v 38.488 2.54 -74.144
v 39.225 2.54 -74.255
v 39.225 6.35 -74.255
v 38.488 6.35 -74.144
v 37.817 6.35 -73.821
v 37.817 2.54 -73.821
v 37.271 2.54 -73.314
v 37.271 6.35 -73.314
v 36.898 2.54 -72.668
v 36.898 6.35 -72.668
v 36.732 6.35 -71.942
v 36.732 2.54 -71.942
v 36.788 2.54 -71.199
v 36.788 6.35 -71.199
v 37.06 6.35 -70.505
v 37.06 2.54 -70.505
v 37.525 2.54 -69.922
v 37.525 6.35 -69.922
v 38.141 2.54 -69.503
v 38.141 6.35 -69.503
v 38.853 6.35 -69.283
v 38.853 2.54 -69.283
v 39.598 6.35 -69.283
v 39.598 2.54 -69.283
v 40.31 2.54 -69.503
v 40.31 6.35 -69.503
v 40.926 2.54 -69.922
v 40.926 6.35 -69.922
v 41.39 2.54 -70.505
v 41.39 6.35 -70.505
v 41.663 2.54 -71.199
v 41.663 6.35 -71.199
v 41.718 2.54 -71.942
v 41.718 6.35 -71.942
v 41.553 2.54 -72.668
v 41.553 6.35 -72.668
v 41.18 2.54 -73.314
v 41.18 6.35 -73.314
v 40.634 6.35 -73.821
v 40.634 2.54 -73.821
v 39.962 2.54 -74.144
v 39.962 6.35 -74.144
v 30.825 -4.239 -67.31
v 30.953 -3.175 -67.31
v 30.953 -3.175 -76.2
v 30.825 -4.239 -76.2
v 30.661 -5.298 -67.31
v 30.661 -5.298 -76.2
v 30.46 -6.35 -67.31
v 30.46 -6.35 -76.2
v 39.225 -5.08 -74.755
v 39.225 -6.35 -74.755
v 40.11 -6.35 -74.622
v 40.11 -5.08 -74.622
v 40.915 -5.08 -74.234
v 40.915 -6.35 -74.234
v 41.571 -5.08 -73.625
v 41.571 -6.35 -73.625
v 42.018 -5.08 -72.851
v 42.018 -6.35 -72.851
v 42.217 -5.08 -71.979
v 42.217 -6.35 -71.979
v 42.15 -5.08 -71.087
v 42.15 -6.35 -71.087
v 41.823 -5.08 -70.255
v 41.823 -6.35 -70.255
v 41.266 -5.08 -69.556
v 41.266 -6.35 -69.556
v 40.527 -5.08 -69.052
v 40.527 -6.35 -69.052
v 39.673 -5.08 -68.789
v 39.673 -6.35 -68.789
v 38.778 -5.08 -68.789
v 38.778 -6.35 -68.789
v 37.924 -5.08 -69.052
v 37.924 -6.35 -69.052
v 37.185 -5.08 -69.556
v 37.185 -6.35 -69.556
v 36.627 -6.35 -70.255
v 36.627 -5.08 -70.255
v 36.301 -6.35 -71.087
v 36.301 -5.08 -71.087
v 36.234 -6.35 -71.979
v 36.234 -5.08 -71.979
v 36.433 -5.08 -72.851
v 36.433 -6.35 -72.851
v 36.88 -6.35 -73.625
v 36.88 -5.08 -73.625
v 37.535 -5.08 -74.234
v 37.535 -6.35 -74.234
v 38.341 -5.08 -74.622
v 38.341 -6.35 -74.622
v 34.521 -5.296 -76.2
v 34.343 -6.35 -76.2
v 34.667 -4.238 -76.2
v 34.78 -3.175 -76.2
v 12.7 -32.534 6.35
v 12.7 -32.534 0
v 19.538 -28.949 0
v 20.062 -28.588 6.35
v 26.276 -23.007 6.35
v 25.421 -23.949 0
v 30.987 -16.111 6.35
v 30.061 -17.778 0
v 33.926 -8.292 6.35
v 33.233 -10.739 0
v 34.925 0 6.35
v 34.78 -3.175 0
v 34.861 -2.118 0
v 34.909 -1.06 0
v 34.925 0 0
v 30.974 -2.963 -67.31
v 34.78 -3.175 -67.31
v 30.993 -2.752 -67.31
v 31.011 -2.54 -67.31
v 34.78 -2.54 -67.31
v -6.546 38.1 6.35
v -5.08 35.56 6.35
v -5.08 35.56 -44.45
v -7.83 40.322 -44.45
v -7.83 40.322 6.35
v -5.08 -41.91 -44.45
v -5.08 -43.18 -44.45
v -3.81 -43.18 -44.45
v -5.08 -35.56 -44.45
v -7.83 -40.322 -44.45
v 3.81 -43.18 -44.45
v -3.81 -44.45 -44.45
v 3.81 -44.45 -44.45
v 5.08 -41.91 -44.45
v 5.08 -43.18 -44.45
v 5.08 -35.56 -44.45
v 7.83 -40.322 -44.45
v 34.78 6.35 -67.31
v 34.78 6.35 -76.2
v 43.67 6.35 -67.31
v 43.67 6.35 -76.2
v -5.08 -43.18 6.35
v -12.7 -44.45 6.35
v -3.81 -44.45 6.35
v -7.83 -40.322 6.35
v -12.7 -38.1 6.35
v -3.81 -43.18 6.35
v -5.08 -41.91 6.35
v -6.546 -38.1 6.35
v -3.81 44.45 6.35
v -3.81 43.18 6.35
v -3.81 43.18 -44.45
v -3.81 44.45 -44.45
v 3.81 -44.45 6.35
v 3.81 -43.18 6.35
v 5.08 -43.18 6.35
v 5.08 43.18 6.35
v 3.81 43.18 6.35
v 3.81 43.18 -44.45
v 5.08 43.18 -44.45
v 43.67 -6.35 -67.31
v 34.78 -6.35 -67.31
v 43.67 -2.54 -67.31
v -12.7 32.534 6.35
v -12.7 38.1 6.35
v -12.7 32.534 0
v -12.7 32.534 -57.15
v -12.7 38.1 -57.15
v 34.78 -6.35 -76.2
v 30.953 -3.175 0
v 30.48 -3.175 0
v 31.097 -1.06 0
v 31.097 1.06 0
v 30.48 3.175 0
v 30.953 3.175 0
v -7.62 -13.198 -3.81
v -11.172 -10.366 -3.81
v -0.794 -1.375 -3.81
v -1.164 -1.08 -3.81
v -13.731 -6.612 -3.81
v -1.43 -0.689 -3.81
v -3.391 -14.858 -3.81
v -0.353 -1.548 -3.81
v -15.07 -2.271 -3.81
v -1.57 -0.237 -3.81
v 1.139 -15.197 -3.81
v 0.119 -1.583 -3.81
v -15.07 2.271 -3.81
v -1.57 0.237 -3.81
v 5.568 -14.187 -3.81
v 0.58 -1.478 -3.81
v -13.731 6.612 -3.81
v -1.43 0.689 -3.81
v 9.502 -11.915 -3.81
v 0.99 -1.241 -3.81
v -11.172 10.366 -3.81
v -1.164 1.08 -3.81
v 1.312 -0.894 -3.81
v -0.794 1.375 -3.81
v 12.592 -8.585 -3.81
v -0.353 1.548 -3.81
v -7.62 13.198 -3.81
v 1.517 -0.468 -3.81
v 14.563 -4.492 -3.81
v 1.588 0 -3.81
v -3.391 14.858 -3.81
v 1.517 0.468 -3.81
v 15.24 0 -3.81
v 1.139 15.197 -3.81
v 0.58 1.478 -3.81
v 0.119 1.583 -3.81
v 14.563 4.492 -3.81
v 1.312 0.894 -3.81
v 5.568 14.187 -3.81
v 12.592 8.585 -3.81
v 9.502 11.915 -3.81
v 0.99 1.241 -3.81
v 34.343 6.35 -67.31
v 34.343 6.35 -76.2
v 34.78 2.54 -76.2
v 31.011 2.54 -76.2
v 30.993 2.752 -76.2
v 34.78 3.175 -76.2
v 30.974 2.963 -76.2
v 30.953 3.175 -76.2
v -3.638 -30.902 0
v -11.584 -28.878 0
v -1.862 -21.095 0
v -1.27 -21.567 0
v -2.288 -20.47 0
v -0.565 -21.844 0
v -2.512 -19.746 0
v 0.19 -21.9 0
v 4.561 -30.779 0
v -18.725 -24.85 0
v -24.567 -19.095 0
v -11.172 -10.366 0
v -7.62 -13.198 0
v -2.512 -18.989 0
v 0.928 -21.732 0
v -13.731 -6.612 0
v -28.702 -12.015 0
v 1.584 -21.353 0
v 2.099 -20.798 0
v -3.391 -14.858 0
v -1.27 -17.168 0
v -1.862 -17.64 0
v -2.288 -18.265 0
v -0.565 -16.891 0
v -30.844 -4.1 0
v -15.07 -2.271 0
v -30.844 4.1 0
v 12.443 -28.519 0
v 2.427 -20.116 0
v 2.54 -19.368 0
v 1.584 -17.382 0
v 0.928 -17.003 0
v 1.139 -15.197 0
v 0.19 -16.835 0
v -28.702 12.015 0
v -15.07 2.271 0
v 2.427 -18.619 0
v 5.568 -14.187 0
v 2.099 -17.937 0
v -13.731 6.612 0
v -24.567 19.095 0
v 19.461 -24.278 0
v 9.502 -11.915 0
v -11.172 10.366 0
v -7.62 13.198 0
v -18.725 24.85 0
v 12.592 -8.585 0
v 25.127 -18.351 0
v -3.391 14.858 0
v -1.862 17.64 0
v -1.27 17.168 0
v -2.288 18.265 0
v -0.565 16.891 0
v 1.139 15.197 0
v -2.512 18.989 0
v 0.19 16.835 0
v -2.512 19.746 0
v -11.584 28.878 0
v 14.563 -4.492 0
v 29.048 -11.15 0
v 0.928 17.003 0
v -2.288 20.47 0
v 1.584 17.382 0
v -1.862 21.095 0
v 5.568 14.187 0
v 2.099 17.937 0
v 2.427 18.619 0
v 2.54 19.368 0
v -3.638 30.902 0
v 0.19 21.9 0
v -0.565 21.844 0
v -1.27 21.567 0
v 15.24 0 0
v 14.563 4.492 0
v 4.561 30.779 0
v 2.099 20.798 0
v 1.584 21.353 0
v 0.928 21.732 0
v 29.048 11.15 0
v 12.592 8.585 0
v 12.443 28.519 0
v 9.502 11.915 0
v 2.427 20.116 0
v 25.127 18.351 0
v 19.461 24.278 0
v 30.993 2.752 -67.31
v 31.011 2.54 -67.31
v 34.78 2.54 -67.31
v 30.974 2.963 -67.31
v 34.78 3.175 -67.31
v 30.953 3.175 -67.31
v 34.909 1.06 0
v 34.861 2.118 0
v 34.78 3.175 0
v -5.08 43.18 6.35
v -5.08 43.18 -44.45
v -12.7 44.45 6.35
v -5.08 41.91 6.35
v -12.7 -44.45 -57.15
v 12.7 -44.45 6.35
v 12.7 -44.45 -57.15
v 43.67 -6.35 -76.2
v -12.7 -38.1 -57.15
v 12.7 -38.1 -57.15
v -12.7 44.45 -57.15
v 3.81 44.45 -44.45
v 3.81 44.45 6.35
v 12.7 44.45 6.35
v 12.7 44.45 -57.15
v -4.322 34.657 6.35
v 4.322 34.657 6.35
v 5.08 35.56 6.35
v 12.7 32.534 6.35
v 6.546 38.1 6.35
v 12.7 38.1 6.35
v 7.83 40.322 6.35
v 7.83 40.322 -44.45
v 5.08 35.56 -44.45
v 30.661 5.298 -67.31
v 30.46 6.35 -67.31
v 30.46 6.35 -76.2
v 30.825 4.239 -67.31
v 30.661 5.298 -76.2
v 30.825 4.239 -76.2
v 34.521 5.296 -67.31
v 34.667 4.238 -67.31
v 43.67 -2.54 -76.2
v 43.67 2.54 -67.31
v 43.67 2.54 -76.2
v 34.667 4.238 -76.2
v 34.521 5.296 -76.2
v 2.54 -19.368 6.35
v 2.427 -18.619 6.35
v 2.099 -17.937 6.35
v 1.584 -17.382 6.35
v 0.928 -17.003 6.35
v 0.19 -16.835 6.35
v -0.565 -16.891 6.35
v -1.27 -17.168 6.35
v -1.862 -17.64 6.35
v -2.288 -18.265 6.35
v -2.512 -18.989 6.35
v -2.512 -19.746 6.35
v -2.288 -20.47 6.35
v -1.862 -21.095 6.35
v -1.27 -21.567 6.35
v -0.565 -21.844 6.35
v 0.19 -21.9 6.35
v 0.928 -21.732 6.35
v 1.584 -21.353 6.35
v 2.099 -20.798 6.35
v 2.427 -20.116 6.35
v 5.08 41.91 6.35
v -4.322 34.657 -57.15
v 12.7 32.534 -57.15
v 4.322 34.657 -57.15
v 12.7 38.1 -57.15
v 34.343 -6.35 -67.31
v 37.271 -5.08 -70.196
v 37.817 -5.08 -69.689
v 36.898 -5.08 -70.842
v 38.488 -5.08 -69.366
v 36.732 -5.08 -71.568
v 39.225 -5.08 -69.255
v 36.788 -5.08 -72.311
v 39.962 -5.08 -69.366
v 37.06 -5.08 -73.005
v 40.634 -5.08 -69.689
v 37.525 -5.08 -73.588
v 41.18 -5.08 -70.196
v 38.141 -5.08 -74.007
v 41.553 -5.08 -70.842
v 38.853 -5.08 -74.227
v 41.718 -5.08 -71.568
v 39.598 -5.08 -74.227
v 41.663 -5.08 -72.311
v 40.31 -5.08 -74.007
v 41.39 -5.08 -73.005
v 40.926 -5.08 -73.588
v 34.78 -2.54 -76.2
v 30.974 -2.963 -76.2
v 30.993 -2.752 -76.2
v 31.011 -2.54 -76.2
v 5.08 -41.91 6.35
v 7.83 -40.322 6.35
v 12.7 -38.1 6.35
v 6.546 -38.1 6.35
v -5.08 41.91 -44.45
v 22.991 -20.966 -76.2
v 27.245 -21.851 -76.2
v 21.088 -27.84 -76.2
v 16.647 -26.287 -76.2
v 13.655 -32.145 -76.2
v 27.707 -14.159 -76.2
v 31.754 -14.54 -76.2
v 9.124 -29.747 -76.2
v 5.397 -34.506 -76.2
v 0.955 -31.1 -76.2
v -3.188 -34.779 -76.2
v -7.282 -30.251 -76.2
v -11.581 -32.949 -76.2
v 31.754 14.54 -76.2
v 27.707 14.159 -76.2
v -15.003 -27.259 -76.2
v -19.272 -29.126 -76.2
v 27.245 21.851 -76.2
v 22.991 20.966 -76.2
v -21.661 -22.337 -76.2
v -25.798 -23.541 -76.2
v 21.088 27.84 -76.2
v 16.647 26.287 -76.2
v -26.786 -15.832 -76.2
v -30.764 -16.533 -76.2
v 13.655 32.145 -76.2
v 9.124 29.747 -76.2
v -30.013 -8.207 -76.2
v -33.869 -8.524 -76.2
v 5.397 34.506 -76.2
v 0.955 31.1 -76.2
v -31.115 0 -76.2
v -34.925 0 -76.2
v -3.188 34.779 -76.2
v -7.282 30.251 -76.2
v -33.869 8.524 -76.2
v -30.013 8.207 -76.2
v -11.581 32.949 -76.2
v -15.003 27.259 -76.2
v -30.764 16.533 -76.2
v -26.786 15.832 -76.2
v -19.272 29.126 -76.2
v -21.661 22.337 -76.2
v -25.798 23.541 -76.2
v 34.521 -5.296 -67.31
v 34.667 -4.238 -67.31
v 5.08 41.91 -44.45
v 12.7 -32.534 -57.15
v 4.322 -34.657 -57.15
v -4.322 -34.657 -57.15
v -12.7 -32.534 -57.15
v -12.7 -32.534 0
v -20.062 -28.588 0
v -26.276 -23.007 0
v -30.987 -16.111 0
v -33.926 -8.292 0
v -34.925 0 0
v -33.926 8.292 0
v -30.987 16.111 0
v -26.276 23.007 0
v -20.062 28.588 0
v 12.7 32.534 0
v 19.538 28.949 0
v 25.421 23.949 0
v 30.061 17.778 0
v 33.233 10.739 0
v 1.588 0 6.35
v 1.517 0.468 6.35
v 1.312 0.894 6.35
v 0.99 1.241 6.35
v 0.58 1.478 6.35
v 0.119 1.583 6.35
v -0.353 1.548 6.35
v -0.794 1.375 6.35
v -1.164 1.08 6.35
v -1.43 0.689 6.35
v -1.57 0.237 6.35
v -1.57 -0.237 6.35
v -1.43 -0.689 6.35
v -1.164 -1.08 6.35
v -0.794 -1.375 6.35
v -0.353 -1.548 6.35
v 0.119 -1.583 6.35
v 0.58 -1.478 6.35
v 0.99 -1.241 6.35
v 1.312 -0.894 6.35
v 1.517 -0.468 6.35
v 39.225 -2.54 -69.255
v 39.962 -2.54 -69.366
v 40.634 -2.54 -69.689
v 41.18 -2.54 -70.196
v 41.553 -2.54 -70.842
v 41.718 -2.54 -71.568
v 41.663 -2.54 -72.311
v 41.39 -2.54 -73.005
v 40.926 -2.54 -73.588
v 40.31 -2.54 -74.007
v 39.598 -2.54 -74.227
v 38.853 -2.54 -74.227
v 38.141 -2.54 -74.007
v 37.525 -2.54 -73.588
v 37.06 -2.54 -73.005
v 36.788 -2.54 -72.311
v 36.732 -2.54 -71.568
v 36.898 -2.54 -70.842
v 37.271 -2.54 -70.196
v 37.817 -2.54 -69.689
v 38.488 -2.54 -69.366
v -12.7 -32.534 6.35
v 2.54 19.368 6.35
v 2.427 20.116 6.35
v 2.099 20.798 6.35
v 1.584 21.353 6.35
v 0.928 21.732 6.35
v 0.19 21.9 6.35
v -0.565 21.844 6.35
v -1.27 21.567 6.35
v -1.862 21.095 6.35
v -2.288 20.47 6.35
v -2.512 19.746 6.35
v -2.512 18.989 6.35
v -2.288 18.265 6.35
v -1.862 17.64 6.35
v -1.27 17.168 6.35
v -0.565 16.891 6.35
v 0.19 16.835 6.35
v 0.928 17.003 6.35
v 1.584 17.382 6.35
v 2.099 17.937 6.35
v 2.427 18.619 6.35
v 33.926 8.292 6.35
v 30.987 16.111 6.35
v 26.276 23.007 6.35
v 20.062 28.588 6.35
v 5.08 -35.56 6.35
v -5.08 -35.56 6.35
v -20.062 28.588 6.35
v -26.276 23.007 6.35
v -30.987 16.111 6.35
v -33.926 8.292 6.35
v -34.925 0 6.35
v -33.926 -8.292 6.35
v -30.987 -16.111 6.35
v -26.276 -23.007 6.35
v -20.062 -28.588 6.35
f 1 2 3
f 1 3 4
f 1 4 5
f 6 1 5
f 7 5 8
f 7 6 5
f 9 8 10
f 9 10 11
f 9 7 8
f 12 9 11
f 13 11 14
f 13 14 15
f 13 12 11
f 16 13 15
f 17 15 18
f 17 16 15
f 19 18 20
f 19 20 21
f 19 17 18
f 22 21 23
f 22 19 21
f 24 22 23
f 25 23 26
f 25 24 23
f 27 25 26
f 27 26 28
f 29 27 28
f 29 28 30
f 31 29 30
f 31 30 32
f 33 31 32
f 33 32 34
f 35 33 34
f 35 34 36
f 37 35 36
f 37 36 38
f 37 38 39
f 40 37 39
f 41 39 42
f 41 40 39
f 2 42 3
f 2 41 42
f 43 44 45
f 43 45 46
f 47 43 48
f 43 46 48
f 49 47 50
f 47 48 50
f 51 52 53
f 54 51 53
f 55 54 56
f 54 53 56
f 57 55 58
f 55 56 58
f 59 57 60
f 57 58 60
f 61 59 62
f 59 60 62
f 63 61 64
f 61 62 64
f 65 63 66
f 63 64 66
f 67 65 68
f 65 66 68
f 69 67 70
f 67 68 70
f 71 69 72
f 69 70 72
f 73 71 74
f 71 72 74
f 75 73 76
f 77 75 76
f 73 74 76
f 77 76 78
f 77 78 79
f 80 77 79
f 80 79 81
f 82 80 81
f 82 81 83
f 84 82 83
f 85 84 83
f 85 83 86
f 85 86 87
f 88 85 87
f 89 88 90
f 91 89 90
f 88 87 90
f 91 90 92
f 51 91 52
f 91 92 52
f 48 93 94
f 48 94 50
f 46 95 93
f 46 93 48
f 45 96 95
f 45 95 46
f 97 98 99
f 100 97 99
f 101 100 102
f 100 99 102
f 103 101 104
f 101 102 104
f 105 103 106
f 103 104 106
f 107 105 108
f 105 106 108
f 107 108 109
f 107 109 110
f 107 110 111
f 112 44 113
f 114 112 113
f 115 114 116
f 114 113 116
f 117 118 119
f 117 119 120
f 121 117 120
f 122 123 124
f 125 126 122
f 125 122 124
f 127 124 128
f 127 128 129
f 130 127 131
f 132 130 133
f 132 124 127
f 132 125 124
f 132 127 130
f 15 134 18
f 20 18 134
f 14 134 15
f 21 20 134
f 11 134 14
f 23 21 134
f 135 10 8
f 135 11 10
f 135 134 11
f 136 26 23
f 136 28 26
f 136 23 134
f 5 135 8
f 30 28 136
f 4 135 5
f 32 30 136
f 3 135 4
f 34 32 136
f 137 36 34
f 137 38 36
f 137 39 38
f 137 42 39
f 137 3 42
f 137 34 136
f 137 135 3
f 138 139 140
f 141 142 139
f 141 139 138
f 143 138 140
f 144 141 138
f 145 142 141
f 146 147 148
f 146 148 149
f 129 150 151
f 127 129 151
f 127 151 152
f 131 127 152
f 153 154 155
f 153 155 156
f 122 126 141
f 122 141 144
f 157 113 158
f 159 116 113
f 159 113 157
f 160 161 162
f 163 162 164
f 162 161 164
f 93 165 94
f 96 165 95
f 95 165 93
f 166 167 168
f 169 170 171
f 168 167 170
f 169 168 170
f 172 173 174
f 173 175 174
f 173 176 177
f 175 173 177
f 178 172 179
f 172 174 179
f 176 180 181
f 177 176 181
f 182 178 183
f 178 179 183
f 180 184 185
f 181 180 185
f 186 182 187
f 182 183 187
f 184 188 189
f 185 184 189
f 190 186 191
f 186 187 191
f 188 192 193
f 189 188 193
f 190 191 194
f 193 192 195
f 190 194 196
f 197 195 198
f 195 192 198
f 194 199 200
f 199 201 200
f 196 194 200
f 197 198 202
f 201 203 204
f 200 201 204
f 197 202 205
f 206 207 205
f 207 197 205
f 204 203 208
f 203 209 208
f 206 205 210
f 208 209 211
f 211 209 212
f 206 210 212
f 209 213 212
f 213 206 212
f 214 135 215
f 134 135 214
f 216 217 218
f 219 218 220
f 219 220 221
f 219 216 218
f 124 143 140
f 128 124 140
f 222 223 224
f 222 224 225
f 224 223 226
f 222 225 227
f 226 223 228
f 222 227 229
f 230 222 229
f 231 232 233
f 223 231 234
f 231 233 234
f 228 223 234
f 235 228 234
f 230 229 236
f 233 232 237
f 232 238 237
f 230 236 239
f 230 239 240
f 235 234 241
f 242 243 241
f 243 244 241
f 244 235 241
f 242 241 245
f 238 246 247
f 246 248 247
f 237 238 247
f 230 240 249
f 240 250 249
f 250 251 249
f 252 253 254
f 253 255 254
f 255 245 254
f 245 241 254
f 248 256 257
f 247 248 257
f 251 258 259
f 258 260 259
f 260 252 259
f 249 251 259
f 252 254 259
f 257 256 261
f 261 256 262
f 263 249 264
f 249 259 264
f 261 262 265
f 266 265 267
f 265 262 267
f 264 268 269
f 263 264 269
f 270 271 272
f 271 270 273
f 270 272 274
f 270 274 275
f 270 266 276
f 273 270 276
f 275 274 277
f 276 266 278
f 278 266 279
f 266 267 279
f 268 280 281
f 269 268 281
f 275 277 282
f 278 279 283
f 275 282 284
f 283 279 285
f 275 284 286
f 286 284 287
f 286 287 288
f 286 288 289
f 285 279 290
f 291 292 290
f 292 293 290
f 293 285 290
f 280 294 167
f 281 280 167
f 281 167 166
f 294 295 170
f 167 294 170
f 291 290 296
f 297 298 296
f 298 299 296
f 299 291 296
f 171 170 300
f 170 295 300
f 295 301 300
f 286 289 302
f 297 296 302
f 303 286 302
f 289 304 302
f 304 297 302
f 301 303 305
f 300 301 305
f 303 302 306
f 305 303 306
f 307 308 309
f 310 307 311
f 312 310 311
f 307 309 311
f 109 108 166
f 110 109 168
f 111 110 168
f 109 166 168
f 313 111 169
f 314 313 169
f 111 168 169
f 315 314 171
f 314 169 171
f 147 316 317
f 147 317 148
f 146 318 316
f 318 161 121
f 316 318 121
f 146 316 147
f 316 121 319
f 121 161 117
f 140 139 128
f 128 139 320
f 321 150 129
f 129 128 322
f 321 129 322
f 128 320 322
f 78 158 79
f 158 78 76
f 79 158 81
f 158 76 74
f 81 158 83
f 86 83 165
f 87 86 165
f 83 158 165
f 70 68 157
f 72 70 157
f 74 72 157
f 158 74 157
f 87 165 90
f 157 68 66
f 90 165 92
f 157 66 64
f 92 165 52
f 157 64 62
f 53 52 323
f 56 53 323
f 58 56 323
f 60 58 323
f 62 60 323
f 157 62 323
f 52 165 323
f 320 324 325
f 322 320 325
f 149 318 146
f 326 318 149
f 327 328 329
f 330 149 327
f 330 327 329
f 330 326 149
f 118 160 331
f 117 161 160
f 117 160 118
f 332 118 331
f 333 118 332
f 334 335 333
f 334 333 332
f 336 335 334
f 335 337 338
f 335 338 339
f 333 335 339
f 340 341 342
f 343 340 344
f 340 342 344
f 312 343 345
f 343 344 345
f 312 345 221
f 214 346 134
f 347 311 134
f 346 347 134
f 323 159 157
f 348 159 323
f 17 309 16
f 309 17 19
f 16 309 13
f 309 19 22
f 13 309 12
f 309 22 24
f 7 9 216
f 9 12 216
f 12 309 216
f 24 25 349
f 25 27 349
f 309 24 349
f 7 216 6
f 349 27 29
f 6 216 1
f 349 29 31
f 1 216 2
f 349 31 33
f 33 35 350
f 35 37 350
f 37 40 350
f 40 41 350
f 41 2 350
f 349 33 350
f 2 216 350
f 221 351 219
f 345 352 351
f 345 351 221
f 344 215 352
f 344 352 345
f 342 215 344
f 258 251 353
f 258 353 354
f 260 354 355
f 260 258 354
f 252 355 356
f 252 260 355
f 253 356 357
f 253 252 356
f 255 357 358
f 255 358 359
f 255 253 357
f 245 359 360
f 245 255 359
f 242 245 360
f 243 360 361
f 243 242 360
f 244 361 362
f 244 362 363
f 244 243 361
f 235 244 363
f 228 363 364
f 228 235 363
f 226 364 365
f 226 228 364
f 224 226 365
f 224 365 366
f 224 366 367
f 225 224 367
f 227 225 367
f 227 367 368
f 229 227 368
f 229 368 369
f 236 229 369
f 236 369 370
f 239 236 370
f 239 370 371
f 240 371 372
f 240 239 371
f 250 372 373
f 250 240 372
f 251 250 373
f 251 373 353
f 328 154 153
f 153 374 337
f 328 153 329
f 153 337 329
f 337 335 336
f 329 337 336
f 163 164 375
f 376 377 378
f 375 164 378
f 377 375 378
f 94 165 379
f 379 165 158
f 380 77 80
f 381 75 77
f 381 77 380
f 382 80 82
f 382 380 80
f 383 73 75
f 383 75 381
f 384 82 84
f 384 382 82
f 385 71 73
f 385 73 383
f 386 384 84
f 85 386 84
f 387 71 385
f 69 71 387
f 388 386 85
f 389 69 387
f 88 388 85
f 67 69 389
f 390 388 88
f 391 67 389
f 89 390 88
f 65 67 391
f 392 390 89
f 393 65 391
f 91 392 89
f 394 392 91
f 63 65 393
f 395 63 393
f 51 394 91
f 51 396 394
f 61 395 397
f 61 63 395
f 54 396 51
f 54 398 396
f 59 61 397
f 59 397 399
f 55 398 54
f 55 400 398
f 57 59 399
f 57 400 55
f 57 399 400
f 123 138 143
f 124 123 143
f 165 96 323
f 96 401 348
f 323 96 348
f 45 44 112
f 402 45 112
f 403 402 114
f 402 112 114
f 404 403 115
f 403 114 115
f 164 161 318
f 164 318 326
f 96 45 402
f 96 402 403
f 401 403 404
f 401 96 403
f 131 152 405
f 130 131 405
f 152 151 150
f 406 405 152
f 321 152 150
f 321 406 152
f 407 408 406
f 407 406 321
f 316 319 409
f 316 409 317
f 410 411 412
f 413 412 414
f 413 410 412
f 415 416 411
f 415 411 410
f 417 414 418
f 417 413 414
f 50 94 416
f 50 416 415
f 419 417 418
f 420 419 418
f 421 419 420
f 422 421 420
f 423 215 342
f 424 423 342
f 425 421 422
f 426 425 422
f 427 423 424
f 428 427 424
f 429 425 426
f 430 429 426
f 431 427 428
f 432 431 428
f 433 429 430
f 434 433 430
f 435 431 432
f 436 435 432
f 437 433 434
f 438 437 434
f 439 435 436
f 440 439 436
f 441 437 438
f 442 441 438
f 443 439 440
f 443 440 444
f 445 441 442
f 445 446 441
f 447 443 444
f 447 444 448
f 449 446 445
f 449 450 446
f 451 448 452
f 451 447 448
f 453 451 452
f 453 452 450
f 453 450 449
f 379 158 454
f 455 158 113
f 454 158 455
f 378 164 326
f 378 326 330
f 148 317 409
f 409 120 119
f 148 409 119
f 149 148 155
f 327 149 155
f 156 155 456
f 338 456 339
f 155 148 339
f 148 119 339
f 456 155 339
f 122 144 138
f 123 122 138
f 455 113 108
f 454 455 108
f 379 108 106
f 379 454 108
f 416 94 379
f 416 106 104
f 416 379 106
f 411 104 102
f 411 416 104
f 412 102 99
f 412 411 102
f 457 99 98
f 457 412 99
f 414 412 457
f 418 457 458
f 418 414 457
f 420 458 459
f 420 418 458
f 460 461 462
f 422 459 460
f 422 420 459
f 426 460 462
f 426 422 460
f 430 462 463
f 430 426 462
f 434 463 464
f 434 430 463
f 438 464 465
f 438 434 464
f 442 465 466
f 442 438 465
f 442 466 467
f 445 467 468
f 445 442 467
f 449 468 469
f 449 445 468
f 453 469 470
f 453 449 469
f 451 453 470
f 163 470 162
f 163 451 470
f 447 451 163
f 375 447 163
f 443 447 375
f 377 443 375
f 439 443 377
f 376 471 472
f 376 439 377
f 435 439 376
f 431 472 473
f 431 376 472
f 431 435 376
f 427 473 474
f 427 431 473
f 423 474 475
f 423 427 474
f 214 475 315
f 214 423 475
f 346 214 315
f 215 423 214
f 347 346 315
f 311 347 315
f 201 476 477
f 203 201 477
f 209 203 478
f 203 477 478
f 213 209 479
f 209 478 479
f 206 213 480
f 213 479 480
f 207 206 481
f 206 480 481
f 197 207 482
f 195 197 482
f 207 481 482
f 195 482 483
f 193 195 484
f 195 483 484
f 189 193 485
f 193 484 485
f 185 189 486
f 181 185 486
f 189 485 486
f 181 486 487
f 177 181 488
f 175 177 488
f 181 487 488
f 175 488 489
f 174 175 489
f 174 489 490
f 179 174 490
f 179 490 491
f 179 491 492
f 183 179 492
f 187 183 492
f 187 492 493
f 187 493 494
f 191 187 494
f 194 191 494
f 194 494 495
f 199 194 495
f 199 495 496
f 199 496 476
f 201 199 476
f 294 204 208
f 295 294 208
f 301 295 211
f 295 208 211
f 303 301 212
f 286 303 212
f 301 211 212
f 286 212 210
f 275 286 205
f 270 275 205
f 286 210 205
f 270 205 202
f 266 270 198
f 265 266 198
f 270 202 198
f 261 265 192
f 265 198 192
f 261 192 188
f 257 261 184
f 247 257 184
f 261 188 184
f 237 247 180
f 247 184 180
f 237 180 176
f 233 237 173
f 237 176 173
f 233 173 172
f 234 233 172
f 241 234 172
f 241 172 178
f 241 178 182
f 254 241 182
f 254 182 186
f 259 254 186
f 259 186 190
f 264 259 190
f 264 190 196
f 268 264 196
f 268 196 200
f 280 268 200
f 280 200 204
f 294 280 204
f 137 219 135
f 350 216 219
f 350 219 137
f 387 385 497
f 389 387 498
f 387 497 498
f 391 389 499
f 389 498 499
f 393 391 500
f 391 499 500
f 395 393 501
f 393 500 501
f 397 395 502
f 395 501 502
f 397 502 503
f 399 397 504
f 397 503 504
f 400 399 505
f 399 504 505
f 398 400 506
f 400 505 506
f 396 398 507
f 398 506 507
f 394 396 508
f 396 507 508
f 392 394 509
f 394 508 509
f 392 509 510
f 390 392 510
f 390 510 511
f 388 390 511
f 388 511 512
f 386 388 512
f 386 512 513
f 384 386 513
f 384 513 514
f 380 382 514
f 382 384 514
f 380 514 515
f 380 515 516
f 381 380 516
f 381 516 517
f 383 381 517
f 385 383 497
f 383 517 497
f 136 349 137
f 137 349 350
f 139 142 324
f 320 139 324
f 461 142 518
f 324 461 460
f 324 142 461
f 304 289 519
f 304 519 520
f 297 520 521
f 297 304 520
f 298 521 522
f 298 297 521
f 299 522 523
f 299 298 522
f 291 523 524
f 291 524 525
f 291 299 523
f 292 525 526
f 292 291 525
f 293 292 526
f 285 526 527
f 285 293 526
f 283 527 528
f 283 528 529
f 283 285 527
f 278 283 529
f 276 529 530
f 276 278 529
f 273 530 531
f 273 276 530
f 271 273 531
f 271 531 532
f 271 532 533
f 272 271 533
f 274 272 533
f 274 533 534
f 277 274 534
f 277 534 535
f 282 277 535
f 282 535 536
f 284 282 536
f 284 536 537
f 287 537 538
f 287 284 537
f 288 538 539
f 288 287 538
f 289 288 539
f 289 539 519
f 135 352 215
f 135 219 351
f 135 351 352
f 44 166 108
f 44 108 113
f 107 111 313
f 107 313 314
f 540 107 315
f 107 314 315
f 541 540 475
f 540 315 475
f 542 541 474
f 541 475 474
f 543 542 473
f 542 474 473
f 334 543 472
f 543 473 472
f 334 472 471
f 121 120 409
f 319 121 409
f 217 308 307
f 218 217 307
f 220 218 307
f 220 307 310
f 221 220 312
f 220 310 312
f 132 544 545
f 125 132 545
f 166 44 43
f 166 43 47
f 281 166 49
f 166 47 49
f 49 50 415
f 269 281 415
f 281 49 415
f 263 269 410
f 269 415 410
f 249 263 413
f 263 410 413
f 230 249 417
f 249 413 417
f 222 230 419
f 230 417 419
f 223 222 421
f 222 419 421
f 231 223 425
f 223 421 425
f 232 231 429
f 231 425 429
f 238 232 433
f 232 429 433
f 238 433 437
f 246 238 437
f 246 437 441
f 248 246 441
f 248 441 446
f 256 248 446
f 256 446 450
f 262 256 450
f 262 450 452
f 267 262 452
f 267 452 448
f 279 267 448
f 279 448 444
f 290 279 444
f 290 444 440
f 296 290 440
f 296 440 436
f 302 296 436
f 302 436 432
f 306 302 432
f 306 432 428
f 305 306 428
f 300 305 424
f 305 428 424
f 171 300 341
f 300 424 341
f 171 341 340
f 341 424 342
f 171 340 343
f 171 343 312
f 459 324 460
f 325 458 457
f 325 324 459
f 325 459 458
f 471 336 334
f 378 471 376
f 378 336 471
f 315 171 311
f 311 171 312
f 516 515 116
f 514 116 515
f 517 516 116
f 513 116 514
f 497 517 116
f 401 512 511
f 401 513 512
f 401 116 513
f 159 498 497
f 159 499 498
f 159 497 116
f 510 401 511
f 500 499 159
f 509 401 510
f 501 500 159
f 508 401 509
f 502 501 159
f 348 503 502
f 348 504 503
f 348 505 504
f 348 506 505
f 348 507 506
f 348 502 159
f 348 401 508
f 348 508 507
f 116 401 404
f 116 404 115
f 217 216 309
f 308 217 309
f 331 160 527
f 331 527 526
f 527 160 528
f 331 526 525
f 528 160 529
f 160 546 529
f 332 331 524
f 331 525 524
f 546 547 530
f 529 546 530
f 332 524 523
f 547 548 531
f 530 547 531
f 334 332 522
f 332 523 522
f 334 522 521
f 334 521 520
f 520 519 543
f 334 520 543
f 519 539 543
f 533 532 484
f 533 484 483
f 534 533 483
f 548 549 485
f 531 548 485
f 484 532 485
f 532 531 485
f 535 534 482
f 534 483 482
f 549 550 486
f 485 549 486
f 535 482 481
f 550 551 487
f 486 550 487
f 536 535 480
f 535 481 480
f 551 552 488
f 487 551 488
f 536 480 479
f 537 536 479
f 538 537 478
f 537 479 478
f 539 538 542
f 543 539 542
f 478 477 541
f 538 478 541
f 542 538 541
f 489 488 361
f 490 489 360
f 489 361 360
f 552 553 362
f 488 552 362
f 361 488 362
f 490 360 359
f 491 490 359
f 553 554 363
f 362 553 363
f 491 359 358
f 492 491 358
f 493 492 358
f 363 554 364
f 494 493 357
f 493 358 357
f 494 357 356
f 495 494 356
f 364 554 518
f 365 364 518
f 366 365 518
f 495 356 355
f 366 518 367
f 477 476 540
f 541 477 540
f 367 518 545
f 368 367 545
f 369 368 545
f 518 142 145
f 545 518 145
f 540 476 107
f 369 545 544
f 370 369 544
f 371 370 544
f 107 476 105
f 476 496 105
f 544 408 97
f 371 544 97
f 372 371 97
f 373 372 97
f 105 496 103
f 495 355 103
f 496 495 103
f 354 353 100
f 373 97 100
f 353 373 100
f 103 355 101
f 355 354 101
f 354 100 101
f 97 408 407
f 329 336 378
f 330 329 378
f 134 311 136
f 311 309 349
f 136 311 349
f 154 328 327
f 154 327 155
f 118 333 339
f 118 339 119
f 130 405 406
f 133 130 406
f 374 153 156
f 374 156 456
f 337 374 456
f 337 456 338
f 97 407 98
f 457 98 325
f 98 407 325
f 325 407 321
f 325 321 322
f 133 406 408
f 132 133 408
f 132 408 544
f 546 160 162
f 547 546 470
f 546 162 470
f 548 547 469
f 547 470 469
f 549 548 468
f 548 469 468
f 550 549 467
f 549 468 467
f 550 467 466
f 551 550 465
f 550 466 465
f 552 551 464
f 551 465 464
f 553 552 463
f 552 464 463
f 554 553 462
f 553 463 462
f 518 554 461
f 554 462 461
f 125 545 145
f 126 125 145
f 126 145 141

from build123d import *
from build123d.topology import SkipClean

# Parameters (mm, degrees)
SKETCH1_R                       = 34.925
SKETCH1_R_2                     = 15.24
SKETCH1_R_3                     = 2.54
BOSS_EXTRUDE1_DEPTH             = 6.35
BOSS_EXTRUDE2_DEPTH             = 6.35
BOSS_EXTRUDE2_DEPTH_BACK        = 3.81
SKETCH1_2_R                     = 15.24
SKETCH3_R                       = 1.5875
CUT_EXTRUDE2_DEPTH              = 51.425557508
BOSS_EXTRUDE3_START             = 76.2
SKETCH4_R                       = 34.925
SKETCH4_R_2                     = 31.115
BOSS_EXTRUDE3_DEPTH             = 76.2
CUT_EXTRUDE3_START              = 30.48
SKETCH5_W                       = 76.2
SKETCH5_H                       = 6.35
CUT_EXTRUDE3_DEPTH              = 61.327220253
BOSS_EXTRUDE4_START             = 2.54
SKETCH6_W                       = 8.89
SKETCH6_H                       = 8.89
SKETCH6_R                       = 2.5
BOSS_EXTRUDE4_DEPTH             = 3.81
BOSS_EXTRUDE5_START             = -2.54
SKETCH6_2_W                     = 8.89
SKETCH6_2_H                     = 8.89
SKETCH6_2_R                     = 2.5
BOSS_EXTRUDE5_DEPTH             = 3.81
BOSS_EXTRUDE6_REACH             = 111.019
BOSS_EXTRUDE6_END_RADIUS        = 31.115
SKETCH8_W                       = 8.89
SKETCH8_H                       = 3.81
SKETCH9_R                       = 3
SKETCH9_R_2                     = 2.5
CUT_EXTRUDE4_DEPTH              = 1.27
BOSS_EXTRUDE7_REACH             = 116.22
SKETCH12_W                      = 25.4
SKETCH12_H                      = 63.5
BOSS_EXTRUDE7_DIRECTION_2_DEPTH = 6.35
CUT_EXTRUDE5_DEPTH              = 50.8


with BuildPart() as part:
    # Sketch1 → Boss-Extrude1 (new body)
    with BuildSketch(Plane.XY):
        Circle(SKETCH1_R)
        Circle(SKETCH1_R_2, mode=Mode.SUBTRACT)
        with Locations((0, 19.3675)):
            Circle(SKETCH1_R_3, mode=Mode.SUBTRACT)
        with Locations((0, -19.3675)):
            Circle(SKETCH1_R_3, mode=Mode.SUBTRACT)
    extrude(amount=BOSS_EXTRUDE1_DEPTH)

    # Sketch1<2> → Boss-Extrude2 (add, two sides: drawn at the far end of the back side and taken through both)
    with BuildSketch(Plane.XY.offset(-BOSS_EXTRUDE2_DEPTH_BACK)):
        Circle(SKETCH1_2_R)
    extrude(amount=BOSS_EXTRUDE2_DEPTH + BOSS_EXTRUDE2_DEPTH_BACK)

    # Sketch3 → Cut-Extrude2 (cut, through all)
    with BuildSketch(Plane.XY.offset(6.35)):
        Circle(SKETCH3_R)
    extrude(amount=-CUT_EXTRUDE2_DEPTH, mode=Mode.SUBTRACT)

    # Sketch4 → Boss-Extrude3 (add)
    with BuildSketch(Plane(origin=(0, 0, 0), x_dir=(-1, 0, 0), z_dir=(0, 0, -1)).offset(BOSS_EXTRUDE3_START)):
        Circle(SKETCH4_R)
        with Locations(Location((0, 0, 0), (0, 0, 180))):
            Circle(SKETCH4_R_2, mode=Mode.SUBTRACT)
    extrude(amount=-BOSS_EXTRUDE3_DEPTH)

    # Sketch5 → Cut-Extrude3 (cut, through all)
    with SkipClean():  # the faces are left unmerged after this step: merging them gives an invalid solid
        with BuildSketch(Plane(origin=(0, 0, 0), x_dir=(0, 0, -1), z_dir=(1, 0, 0)).offset(CUT_EXTRUDE3_START)):
            with Locations((38.1, 0)):
                Rectangle(SKETCH5_W, SKETCH5_H)
        extrude(amount=CUT_EXTRUDE3_DEPTH, mode=Mode.SUBTRACT)



with BuildPart() as body_2:
    # Sketch6 → Boss-Extrude4 (new body)
    with BuildSketch(Plane(origin=(0, 0, 0), x_dir=(1, 0, 0), z_dir=(0, 1, 0)).offset(BOSS_EXTRUDE4_START)):
        with Locations((39.225382402, 71.755)):
            Rectangle(SKETCH6_W, SKETCH6_H)
        with Locations(Location((39.225382402, 71.755, 0), (0, 0, 90))):
            Circle(SKETCH6_R, mode=Mode.SUBTRACT)
    extrude(amount=BOSS_EXTRUDE4_DEPTH)


with BuildPart() as body_3:
    # Sketch6<2> → Boss-Extrude5 (new body)
    with BuildSketch(Plane(origin=(0, 0, 0), x_dir=(1, 0, 0), z_dir=(0, 1, 0)).offset(BOSS_EXTRUDE5_START)):
        with Locations((39.225382402, 71.755)):
            Rectangle(SKETCH6_2_W, SKETCH6_2_H)
        with Locations(Location((39.225382402, 71.755, 0), (0, 0, 270))):
            Circle(SKETCH6_2_R, mode=Mode.SUBTRACT)
    extrude(amount=-BOSS_EXTRUDE5_DEPTH)


with BuildPart() as part_1:
    with SkipClean():  # the faces are left unmerged after this step: merging them gives an invalid solid
        add(part.part)

        add(body_2.part)  # Boss-Extrude6 merges body 2

        add(body_3.part)  # Boss-Extrude6 merges body 3
        # Boss-Extrude6: up to this cylinder (the profile starts outside it)
        boss_extrude6_end = Plane(origin=(0, 0, -71.755), z_dir=(0, 0, 1)) * Cylinder(BOSS_EXTRUDE6_END_RADIUS, 285.268, mode=Mode.PRIVATE)
        # Sketch8 → Boss-Extrude6 (add, up to the surface)
        with BuildSketch(Plane.ZY.offset(-34.780382402), mode=Mode.PRIVATE) as boss_extrude6_sk1:
            with Locations((-71.755, -4.445)):
                Rectangle(SKETCH8_W, SKETCH8_H)
        boss_extrude6_tool1 = extrude(boss_extrude6_sk1.sketch, amount=BOSS_EXTRUDE6_REACH, mode=Mode.PRIVATE) - boss_extrude6_end
        add(boss_extrude6_tool1.solids().sort_by_distance((34.780382, -4.445, -71.755))[0])
        # Sketch8 → Boss-Extrude6 (add, up to the surface)
        with BuildSketch(Plane.ZY.offset(-34.780382402), mode=Mode.PRIVATE) as boss_extrude6_sk2:
            with Locations((-71.755, 4.445)):
                Rectangle(SKETCH8_W, SKETCH8_H)
        boss_extrude6_tool2 = extrude(boss_extrude6_sk2.sketch, amount=BOSS_EXTRUDE6_REACH, mode=Mode.PRIVATE) - boss_extrude6_end
        add(boss_extrude6_tool2.solids().sort_by_distance((34.780382, 4.445, -71.755))[0])

    # Sketch9 → Cut-Extrude4 (cut)
    with SkipClean():  # the faces are left unmerged after this step: merging them gives an invalid solid
        with BuildSketch(Plane.XZ.offset(6.35)):
            with Locations(Location((39.225382402, -71.755, 0), (0, 0, 270))):
                Circle(SKETCH9_R)
            with Locations(Location((39.225382402, -71.755, 0), (0, 0, 90))):
                Circle(SKETCH9_R_2, mode=Mode.SUBTRACT)
        extrude(amount=-CUT_EXTRUDE4_DEPTH, mode=Mode.SUBTRACT)

    # Sketch12 → Boss-Extrude7 (add, up to next)
    with BuildSketch(Plane(origin=(0, -38.1, 0), x_dir=(1, 0, 0), z_dir=(0, 1, 0)), mode=Mode.PRIVATE) as boss_extrude7_sk1:
        with Locations((0, 25.4)):
            Rectangle(SKETCH12_W, SKETCH12_H)
    boss_extrude7_tool1 = extrude(boss_extrude7_sk1.sketch, amount=BOSS_EXTRUDE7_REACH, mode=Mode.PRIVATE) - part_1.part
    boss_extrude7 = boss_extrude7_tool1.solids().sort_by_distance((0, -38.1, -25.4))[0]
    add(boss_extrude7)

    # Sketch12 → Boss-Extrude7 direction 2 (add)
    with SkipClean():  # the faces are left unmerged after this step: merging them gives an invalid solid
        with BuildSketch(Plane(origin=(0, -38.1, 0), x_dir=(1, 0, 0), z_dir=(0, 1, 0))):
            with Locations((0, 25.4)):
                Rectangle(SKETCH12_W, SKETCH12_H)
        boss_extrude7_direction_2 = extrude(amount=-BOSS_EXTRUDE7_DIRECTION_2_DEPTH)

    # Sketch13 → Cut-Extrude5 (cut)
    with SkipClean():  # the faces are left unmerged after this step: merging them gives an invalid solid
        with BuildSketch(Plane.XY.offset(6.35)):
            Polygon((-3.81, -43.18), (-3.81, -44.45), (3.81, -44.45), (3.81, -43.18), (5.08, -43.18), (5.08, -41.91), (7.829630657, -40.3225), (5.08, -35.56), (-5.08, -35.56), (-7.829630657, -40.3225), (-5.08, -41.91), (-5.08, -43.18), align=None)
        cut_extrude5 = extrude(amount=-CUT_EXTRUDE5_DEPTH, mode=Mode.SUBTRACT)

    # Mirror1: Boss-Extrude7, Boss-Extrude7 direction 2, Cut-Extrude5 across plane
    with SkipClean():  # the faces are left unmerged after this step: merging them gives an invalid solid
        add(boss_extrude7.mirror(Plane.ZX))
        add(boss_extrude7_direction_2.mirror(Plane.ZX))
        add(cut_extrude5.mirror(Plane.ZX), mode=Mode.SUBTRACT)


solid = part_1.part
